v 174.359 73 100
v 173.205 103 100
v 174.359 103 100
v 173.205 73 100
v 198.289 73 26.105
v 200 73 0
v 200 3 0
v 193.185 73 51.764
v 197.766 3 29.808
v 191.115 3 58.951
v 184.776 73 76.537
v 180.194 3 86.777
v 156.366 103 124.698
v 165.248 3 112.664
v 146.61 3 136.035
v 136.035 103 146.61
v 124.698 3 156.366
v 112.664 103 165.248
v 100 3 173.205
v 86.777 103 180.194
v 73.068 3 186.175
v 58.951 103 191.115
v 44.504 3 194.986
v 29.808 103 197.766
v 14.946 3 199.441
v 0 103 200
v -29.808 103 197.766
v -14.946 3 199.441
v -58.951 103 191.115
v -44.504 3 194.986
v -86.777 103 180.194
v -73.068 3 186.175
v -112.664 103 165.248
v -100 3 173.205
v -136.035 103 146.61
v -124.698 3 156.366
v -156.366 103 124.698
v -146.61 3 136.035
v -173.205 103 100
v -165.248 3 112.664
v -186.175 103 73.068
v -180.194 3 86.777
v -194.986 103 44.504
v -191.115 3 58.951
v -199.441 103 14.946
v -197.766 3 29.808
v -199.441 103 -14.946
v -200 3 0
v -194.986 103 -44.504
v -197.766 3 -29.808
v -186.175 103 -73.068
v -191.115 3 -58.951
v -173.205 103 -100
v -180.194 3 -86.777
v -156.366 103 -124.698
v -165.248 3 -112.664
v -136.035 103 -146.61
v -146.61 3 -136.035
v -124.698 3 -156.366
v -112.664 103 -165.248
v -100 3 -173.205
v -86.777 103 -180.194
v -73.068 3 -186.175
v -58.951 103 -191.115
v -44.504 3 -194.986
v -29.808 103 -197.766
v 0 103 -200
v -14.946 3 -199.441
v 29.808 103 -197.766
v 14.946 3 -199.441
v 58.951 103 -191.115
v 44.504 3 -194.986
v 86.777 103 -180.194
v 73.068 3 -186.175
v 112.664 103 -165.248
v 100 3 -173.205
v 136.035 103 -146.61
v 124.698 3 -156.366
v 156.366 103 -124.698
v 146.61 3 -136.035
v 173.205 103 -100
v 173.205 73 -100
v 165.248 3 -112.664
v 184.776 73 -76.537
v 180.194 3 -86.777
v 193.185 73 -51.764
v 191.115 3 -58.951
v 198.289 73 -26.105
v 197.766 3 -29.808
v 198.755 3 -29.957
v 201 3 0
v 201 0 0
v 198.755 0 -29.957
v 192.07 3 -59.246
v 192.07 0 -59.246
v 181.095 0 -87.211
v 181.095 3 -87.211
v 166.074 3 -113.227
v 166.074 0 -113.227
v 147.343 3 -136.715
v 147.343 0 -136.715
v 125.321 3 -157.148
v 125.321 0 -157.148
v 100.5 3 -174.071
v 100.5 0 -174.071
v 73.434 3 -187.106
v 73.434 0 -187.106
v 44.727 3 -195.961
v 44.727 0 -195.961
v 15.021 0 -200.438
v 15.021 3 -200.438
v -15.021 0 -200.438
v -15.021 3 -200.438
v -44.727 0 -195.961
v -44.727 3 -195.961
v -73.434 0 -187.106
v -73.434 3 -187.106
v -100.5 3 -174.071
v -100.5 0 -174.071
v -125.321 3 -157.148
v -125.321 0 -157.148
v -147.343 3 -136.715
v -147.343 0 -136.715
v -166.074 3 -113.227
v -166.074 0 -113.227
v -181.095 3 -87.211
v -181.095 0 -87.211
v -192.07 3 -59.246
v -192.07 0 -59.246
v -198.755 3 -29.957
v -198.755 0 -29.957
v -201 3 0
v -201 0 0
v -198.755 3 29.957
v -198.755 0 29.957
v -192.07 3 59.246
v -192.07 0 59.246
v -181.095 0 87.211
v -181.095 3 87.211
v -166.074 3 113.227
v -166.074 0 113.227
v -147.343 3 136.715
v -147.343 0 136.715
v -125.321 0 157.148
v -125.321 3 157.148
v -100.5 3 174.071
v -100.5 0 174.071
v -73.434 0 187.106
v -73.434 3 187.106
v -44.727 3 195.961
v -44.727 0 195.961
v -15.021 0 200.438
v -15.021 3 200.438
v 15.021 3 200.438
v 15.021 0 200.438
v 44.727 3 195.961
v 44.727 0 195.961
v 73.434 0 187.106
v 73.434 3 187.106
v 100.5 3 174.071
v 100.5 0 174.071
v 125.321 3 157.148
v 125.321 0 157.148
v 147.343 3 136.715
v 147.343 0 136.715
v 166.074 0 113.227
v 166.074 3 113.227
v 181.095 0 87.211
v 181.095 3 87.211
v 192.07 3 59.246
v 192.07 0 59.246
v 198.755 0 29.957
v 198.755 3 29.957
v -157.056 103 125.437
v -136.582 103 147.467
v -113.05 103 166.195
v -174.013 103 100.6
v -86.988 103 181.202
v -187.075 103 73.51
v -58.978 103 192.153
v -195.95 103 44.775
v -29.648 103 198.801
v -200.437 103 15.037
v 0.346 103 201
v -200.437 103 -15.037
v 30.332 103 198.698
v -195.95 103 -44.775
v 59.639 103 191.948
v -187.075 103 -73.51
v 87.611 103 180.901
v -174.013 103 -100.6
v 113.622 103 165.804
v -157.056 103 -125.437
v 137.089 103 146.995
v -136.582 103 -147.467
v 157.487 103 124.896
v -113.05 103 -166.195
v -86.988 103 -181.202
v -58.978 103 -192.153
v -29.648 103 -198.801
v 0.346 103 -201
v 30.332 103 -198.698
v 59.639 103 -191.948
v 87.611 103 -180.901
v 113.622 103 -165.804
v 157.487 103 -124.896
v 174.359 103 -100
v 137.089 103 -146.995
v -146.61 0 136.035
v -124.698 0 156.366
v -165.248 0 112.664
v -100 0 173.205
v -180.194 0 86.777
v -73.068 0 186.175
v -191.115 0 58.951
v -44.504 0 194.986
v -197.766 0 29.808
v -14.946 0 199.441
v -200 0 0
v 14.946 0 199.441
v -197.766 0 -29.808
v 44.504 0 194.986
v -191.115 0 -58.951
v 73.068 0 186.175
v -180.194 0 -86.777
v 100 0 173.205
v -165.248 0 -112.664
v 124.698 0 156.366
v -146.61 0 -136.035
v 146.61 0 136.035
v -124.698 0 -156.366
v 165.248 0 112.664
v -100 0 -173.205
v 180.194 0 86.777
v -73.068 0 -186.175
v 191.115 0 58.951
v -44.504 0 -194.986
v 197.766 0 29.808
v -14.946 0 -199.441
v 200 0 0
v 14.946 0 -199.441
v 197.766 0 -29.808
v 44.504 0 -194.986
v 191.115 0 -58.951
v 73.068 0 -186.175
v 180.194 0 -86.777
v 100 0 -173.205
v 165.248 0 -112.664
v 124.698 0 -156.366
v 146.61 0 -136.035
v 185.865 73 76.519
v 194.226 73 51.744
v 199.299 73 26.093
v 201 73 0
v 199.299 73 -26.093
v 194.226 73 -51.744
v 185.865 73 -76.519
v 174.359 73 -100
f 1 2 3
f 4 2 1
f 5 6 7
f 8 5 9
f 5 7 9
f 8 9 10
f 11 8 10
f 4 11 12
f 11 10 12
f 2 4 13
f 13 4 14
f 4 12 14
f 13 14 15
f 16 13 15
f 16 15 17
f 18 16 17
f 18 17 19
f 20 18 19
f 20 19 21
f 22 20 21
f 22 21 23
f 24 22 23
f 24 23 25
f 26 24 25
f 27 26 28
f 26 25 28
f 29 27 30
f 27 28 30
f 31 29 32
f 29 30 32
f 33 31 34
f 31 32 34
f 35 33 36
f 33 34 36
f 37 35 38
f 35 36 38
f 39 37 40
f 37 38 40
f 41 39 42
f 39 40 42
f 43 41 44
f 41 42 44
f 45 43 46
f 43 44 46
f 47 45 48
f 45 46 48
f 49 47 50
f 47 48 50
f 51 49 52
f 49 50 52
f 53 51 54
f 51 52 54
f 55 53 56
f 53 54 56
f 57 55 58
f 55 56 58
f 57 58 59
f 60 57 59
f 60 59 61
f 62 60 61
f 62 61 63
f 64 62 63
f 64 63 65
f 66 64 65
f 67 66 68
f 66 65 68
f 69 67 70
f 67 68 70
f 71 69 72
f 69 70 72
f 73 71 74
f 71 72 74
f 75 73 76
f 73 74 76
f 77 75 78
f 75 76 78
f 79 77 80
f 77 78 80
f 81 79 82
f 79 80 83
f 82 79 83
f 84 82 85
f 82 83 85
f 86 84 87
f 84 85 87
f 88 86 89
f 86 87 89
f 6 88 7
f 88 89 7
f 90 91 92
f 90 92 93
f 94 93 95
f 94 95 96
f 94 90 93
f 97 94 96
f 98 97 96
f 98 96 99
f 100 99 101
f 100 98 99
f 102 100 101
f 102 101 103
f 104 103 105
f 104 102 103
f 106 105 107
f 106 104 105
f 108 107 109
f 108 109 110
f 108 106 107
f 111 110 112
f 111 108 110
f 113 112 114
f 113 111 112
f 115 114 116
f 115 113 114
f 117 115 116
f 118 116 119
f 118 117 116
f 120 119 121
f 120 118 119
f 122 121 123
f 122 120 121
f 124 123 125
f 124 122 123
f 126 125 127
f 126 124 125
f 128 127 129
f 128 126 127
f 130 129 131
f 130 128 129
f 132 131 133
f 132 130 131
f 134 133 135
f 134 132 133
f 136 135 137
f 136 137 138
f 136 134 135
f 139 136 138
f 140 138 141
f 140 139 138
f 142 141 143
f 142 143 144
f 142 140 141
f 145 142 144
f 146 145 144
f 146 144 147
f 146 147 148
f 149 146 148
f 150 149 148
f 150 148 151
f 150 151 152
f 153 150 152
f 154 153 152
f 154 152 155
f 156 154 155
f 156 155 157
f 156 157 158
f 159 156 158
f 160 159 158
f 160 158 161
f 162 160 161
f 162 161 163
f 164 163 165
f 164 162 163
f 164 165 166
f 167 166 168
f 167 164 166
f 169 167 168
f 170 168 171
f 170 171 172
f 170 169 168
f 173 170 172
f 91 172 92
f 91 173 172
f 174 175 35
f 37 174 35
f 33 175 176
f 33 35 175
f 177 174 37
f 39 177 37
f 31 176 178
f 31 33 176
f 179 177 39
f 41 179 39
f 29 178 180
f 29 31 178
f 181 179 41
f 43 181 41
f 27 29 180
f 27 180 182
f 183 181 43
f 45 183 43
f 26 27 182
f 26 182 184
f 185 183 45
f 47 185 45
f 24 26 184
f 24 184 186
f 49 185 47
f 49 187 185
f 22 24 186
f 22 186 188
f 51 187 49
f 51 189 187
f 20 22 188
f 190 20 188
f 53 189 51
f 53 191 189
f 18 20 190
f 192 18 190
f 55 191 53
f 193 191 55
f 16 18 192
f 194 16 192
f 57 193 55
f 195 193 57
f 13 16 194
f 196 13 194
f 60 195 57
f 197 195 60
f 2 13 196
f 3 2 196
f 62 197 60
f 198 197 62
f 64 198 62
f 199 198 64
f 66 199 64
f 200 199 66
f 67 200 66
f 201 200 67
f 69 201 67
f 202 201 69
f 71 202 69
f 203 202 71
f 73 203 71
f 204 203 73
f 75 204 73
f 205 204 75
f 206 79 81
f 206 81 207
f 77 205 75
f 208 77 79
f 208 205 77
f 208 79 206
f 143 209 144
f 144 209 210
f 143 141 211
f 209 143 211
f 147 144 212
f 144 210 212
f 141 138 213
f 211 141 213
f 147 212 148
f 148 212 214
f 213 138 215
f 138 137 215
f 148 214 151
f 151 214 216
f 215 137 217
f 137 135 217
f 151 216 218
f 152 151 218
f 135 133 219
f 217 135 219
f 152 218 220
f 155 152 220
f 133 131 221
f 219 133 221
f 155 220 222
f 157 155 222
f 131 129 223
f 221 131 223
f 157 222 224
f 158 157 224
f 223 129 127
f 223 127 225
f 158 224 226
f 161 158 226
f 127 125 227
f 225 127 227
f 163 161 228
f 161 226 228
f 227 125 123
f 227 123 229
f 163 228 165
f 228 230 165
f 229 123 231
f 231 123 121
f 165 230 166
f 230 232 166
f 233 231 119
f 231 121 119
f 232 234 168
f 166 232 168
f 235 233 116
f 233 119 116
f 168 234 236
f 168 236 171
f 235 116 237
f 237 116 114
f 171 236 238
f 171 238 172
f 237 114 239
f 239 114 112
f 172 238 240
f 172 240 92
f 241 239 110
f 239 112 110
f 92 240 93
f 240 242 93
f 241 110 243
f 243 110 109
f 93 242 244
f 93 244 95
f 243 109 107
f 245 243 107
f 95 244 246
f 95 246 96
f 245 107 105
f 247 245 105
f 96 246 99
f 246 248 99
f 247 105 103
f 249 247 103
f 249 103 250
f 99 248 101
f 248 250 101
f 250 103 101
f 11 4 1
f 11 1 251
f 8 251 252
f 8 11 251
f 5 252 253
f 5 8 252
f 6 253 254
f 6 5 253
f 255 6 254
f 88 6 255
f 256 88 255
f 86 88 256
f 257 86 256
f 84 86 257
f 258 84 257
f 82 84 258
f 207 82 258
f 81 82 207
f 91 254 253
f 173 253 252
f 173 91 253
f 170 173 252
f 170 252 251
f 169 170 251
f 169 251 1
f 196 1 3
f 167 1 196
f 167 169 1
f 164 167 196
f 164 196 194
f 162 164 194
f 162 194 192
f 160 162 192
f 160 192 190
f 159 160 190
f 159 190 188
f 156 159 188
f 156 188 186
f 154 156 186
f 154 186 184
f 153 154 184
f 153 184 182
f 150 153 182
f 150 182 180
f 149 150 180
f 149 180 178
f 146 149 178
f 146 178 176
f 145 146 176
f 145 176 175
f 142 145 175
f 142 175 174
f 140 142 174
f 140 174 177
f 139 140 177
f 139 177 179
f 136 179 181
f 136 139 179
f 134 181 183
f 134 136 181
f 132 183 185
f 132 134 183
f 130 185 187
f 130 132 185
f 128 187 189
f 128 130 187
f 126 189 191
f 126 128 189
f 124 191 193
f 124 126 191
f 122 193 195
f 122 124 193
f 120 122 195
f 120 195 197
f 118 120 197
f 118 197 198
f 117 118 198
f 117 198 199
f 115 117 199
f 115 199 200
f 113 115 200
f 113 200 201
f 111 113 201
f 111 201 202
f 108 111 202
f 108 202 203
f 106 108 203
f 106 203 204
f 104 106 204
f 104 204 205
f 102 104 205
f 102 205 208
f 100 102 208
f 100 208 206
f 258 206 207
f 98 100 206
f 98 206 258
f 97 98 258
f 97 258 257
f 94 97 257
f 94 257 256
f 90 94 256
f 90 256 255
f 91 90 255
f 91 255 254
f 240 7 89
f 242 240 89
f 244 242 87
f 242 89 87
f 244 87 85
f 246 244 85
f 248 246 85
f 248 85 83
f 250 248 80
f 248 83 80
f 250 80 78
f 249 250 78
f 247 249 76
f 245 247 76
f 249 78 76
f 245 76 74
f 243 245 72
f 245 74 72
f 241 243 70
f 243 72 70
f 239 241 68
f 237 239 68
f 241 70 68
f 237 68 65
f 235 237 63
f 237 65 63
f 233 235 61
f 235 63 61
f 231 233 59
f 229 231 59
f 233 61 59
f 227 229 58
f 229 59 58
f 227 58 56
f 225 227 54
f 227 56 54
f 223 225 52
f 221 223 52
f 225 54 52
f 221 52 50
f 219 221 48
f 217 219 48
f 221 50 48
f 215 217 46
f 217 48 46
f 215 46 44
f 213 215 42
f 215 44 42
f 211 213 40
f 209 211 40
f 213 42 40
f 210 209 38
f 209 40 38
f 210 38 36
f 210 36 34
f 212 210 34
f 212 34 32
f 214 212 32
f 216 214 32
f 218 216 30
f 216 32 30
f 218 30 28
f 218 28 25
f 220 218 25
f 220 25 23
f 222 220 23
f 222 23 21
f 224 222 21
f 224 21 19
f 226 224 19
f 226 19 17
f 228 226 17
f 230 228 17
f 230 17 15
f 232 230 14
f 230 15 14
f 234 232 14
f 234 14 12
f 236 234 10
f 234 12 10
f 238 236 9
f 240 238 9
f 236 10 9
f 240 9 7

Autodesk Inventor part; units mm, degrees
ref_plane "YZ Plane" through (0, 0, 0) normal (1, 0, 0) x (0, 1, 0)
ref_plane "XZ Plane" through (0, 0, 0) normal (0, 1, 0) x (-1, 0, 0)
ref_plane "XY Plane" through (0, 0, 0) normal (0, 0, 1) x (1, 0, 0)
sketch "Sketch1" plane through (0, 0, 0) normal (0, 1, 0) x (-1, 0, 0)
  circle A0 centre (0, 0) radius 200
  dimension "d0" = 400
ref_plane "Work Plane1" through (0, 3, 0) normal (0, 1, 0) x (1, 0, 0)
sketch "Sketch2" plane through (0, 3, 0) normal (0, 1, 0) x (1, 0, 0)
  line L0 (-63.5, -143.5) -> (63.5, -143.5)
  line L1 (63.5, -143.5) -> (63.5, 143.5)
  line L2 (63.5, 143.5) -> (-63.5, 143.5)
  line L3 (-63.5, 143.5) -> (-63.5, -143.5)
  line L4 (-63.5, -143.5) -> (63.5, 143.5) construction
  line L5 (63.5, -143.5) -> (-63.5, 143.5) construction
  point P0 (0, 0)
  dimension "d3" = 127
  dimension "d4" = 287
extrude "Extrusion2" [suppressed]
ref_plane "Work Plane4" through (0, 3, 0) normal (0, 1, 0) x (1, 0, 0)
sketch "Sketch3" plane through (0, 3, 0) normal (0, 1, 0) x (1, 0, 0)
  line L0 (-63.5, 143.5) -> (-63.5, -143.5) projected
  line L1 (-63.5, 0) -> (-123.5, 0)
  line L2 (-123.5, 0) -> (-93.5, 0)
  line L3 (-93.5, 0) -> (-119.5, 0)
  circle A0 centre (-119.5, 0) radius 2.5
  circle A1 centre (-117.932, -8.8925) radius 2.5
  circle A2 centre (-113.4172, -16.7125) radius 2.5
  circle A3 centre (-106.5, -22.5167) radius 2.5
  circle A4 centre (-98.0149, -25.605) radius 2.5
  circle A5 centre (-88.9851, -25.605) radius 2.5
  circle A6 centre (-80.5, -22.5167) radius 2.5
  circle A7 centre (-73.5828, -16.7125) radius 2.5
  circle A8 centre (-69.068, -8.8925) radius 2.5
  circle A9 centre (-67.5, 0) radius 2.5
  circle A10 centre (-69.068, 8.8925) radius 2.5
  circle A11 centre (-73.5828, 16.7125) radius 2.5
  circle A12 centre (-80.5, 22.5167) radius 2.5
  circle A13 centre (-88.9851, 25.605) radius 2.5
  circle A14 centre (-98.0149, 25.605) radius 2.5
  circle A15 centre (-106.5, 22.5167) radius 2.5
  circle A16 centre (-113.4172, 16.7125) radius 2.5
  circle A17 centre (-117.932, 8.8925) radius 2.5
  line L4 (-93.5, 0) -> (-110.5, 0)
  line L5 (-110.5, 0) -> (-92.5712, 0)
  line L6 (-93.5, 0) -> (-103.5, 0)
  circle A18 centre (-110.5, 0) radius 2
  circle A19 centre (-103.5, 0) radius 1.5
  circle A20 centre (-109.4748, -5.8143) radius 2
  circle A21 centre (-106.5228, -10.9274) radius 2
  circle A22 centre (-102, -14.7224) radius 2
  circle A23 centre (-96.452, -16.7417) radius 2
  circle A24 centre (-90.548, -16.7417) radius 2
  circle A25 centre (-85, -14.7224) radius 2
  circle A26 centre (-80.4772, -10.9274) radius 2
  circle A27 centre (-77.5252, -5.8143) radius 2
  circle A28 centre (-76.5, 0) radius 2
  circle A29 centre (-77.5252, 5.8143) radius 2
  circle A30 centre (-80.4772, 10.9274) radius 2
  circle A31 centre (-85, 14.7224) radius 2
  circle A32 centre (-90.548, 16.7417) radius 2
  circle A33 centre (-96.452, 16.7417) radius 2
  circle A34 centre (-102, 14.7224) radius 2
  circle A35 centre (-106.5228, 10.9274) radius 2
  circle A36 centre (-109.4748, 5.8143) radius 2
  circle A37 centre (-101.5902, -5.8779) radius 1.5
  circle A38 centre (-96.5902, -9.5106) radius 1.5
  circle A39 centre (-90.4098, -9.5106) radius 1.5
  circle A40 centre (-85.4098, -5.8779) radius 1.5
  circle A41 centre (-83.5, 0) radius 1.5
  circle A42 centre (-85.4098, 5.8779) radius 1.5
  circle A43 centre (-90.4098, 9.5106) radius 1.5
  circle A44 centre (-96.5902, 9.5106) radius 1.5
  circle A45 centre (-101.5902, 5.8779) radius 1.5
  point P0 (0, 0)
  dimension "d7" = 60
  dimension "d8" = 30
  dimension "d9" = 26
  dimension "d10" = 5
  dimension "d13" = 360
  dimension "d15" = 17
  dimension "d16" = 10
  dimension "d18" = 4
  dimension "d19" = 3
  dimension "d22" = 360
  dimension "d26" = 360
extrude "Extrusion3" [suppressed]
ref_plane "Work Plane2" through (0, 3, 0) normal (0, 1, 0) x (1, 0, 0)
sketch "Sketch4" plane through (0, 3, 0) normal (0, 1, 0) x (1, 0, 0)
  line L0 (0, 0) -> (0, -170)
  line L1 (0, -170) -> (0, 170)
  line L2 (0, -170) -> (-40, -170)
  line L3 (-40, -170) -> (-65, -170)
  line L4 (-65, -170) -> (0, -170)
  line L5 (0, -170) -> (65, -170)
  line L6 (0, 170) -> (-65, 170)
  line L7 (-65, 170) -> (0, 170)
  line L8 (0, 170) -> (65, 170)
  circle A0 centre (65, 170) radius 1.5
  circle A1 centre (-65, 170) radius 1.5
  circle A2 centre (-65, -170) radius 1.5
  circle A3 centre (65, -170) radius 1.5
  dimension "d30" = 170
  dimension "d31" = 340
  dimension "d32" = 40
  dimension "d33" = 25
  dimension "d34" = 65
  dimension "d35" = 65
  dimension "d36" = 65
  dimension "d37" = 65
  dimension "d38" = 65
  dimension "d39" = 3
  dimension "d40" = 3
  dimension "d41" = 3
  dimension "d42" = 3
extrude "Extrusion4" [suppressed]
ref_plane "Work Plane3" through (0, 3, 0) normal (0, 1, 0) x (1, 0, 0)
sketch "Sketch5" plane through (0, 3, 0) normal (0, 1, 0) x (1, 0, 0)
  circle A0 centre (0, 0) radius 201
  circle A1 centre (0, 0) radius 200
  dimension "d45" = 402
  dimension "d46" = 400
extrude "Extrusion5" add sketch "Sketch5" along normal blind 100 and the other way blind 3
sketch "Sketch6" plane through (0, 0, 0) normal (1, 0, 0) x (0, 1, 0)
  line L0 (0, -200) -> (0, 200) projected
  line L1 (0, -200) -> (0, 200)
  line L2 (0, 200) -> (103, 201)
  line L3 (0, 201) -> (103, 201) projected
  line L4 (103, -201) -> (103, 201) projected
  line L5 (103, -201) -> (103, 201)
  line L6 (103, 201) -> (103, 0)
  line L7 (73, -100) -> (133, -100)
  line L8 (133, -100) -> (133, 100)
  line L9 (133, 100) -> (73, 100)
  line L10 (73, 100) -> (73, -100)
  line L11 (73, -100) -> (133, 100) construction
  line L12 (133, -100) -> (73, 100) construction
  point P0 (0, 0)
  dimension "d51" = 60
  dimension "d52" = 200
extrude "Extrusion6" cut sketch "Sketch6" along normal blind 300
properties part number "border" material "PC/ABS Plastic"
